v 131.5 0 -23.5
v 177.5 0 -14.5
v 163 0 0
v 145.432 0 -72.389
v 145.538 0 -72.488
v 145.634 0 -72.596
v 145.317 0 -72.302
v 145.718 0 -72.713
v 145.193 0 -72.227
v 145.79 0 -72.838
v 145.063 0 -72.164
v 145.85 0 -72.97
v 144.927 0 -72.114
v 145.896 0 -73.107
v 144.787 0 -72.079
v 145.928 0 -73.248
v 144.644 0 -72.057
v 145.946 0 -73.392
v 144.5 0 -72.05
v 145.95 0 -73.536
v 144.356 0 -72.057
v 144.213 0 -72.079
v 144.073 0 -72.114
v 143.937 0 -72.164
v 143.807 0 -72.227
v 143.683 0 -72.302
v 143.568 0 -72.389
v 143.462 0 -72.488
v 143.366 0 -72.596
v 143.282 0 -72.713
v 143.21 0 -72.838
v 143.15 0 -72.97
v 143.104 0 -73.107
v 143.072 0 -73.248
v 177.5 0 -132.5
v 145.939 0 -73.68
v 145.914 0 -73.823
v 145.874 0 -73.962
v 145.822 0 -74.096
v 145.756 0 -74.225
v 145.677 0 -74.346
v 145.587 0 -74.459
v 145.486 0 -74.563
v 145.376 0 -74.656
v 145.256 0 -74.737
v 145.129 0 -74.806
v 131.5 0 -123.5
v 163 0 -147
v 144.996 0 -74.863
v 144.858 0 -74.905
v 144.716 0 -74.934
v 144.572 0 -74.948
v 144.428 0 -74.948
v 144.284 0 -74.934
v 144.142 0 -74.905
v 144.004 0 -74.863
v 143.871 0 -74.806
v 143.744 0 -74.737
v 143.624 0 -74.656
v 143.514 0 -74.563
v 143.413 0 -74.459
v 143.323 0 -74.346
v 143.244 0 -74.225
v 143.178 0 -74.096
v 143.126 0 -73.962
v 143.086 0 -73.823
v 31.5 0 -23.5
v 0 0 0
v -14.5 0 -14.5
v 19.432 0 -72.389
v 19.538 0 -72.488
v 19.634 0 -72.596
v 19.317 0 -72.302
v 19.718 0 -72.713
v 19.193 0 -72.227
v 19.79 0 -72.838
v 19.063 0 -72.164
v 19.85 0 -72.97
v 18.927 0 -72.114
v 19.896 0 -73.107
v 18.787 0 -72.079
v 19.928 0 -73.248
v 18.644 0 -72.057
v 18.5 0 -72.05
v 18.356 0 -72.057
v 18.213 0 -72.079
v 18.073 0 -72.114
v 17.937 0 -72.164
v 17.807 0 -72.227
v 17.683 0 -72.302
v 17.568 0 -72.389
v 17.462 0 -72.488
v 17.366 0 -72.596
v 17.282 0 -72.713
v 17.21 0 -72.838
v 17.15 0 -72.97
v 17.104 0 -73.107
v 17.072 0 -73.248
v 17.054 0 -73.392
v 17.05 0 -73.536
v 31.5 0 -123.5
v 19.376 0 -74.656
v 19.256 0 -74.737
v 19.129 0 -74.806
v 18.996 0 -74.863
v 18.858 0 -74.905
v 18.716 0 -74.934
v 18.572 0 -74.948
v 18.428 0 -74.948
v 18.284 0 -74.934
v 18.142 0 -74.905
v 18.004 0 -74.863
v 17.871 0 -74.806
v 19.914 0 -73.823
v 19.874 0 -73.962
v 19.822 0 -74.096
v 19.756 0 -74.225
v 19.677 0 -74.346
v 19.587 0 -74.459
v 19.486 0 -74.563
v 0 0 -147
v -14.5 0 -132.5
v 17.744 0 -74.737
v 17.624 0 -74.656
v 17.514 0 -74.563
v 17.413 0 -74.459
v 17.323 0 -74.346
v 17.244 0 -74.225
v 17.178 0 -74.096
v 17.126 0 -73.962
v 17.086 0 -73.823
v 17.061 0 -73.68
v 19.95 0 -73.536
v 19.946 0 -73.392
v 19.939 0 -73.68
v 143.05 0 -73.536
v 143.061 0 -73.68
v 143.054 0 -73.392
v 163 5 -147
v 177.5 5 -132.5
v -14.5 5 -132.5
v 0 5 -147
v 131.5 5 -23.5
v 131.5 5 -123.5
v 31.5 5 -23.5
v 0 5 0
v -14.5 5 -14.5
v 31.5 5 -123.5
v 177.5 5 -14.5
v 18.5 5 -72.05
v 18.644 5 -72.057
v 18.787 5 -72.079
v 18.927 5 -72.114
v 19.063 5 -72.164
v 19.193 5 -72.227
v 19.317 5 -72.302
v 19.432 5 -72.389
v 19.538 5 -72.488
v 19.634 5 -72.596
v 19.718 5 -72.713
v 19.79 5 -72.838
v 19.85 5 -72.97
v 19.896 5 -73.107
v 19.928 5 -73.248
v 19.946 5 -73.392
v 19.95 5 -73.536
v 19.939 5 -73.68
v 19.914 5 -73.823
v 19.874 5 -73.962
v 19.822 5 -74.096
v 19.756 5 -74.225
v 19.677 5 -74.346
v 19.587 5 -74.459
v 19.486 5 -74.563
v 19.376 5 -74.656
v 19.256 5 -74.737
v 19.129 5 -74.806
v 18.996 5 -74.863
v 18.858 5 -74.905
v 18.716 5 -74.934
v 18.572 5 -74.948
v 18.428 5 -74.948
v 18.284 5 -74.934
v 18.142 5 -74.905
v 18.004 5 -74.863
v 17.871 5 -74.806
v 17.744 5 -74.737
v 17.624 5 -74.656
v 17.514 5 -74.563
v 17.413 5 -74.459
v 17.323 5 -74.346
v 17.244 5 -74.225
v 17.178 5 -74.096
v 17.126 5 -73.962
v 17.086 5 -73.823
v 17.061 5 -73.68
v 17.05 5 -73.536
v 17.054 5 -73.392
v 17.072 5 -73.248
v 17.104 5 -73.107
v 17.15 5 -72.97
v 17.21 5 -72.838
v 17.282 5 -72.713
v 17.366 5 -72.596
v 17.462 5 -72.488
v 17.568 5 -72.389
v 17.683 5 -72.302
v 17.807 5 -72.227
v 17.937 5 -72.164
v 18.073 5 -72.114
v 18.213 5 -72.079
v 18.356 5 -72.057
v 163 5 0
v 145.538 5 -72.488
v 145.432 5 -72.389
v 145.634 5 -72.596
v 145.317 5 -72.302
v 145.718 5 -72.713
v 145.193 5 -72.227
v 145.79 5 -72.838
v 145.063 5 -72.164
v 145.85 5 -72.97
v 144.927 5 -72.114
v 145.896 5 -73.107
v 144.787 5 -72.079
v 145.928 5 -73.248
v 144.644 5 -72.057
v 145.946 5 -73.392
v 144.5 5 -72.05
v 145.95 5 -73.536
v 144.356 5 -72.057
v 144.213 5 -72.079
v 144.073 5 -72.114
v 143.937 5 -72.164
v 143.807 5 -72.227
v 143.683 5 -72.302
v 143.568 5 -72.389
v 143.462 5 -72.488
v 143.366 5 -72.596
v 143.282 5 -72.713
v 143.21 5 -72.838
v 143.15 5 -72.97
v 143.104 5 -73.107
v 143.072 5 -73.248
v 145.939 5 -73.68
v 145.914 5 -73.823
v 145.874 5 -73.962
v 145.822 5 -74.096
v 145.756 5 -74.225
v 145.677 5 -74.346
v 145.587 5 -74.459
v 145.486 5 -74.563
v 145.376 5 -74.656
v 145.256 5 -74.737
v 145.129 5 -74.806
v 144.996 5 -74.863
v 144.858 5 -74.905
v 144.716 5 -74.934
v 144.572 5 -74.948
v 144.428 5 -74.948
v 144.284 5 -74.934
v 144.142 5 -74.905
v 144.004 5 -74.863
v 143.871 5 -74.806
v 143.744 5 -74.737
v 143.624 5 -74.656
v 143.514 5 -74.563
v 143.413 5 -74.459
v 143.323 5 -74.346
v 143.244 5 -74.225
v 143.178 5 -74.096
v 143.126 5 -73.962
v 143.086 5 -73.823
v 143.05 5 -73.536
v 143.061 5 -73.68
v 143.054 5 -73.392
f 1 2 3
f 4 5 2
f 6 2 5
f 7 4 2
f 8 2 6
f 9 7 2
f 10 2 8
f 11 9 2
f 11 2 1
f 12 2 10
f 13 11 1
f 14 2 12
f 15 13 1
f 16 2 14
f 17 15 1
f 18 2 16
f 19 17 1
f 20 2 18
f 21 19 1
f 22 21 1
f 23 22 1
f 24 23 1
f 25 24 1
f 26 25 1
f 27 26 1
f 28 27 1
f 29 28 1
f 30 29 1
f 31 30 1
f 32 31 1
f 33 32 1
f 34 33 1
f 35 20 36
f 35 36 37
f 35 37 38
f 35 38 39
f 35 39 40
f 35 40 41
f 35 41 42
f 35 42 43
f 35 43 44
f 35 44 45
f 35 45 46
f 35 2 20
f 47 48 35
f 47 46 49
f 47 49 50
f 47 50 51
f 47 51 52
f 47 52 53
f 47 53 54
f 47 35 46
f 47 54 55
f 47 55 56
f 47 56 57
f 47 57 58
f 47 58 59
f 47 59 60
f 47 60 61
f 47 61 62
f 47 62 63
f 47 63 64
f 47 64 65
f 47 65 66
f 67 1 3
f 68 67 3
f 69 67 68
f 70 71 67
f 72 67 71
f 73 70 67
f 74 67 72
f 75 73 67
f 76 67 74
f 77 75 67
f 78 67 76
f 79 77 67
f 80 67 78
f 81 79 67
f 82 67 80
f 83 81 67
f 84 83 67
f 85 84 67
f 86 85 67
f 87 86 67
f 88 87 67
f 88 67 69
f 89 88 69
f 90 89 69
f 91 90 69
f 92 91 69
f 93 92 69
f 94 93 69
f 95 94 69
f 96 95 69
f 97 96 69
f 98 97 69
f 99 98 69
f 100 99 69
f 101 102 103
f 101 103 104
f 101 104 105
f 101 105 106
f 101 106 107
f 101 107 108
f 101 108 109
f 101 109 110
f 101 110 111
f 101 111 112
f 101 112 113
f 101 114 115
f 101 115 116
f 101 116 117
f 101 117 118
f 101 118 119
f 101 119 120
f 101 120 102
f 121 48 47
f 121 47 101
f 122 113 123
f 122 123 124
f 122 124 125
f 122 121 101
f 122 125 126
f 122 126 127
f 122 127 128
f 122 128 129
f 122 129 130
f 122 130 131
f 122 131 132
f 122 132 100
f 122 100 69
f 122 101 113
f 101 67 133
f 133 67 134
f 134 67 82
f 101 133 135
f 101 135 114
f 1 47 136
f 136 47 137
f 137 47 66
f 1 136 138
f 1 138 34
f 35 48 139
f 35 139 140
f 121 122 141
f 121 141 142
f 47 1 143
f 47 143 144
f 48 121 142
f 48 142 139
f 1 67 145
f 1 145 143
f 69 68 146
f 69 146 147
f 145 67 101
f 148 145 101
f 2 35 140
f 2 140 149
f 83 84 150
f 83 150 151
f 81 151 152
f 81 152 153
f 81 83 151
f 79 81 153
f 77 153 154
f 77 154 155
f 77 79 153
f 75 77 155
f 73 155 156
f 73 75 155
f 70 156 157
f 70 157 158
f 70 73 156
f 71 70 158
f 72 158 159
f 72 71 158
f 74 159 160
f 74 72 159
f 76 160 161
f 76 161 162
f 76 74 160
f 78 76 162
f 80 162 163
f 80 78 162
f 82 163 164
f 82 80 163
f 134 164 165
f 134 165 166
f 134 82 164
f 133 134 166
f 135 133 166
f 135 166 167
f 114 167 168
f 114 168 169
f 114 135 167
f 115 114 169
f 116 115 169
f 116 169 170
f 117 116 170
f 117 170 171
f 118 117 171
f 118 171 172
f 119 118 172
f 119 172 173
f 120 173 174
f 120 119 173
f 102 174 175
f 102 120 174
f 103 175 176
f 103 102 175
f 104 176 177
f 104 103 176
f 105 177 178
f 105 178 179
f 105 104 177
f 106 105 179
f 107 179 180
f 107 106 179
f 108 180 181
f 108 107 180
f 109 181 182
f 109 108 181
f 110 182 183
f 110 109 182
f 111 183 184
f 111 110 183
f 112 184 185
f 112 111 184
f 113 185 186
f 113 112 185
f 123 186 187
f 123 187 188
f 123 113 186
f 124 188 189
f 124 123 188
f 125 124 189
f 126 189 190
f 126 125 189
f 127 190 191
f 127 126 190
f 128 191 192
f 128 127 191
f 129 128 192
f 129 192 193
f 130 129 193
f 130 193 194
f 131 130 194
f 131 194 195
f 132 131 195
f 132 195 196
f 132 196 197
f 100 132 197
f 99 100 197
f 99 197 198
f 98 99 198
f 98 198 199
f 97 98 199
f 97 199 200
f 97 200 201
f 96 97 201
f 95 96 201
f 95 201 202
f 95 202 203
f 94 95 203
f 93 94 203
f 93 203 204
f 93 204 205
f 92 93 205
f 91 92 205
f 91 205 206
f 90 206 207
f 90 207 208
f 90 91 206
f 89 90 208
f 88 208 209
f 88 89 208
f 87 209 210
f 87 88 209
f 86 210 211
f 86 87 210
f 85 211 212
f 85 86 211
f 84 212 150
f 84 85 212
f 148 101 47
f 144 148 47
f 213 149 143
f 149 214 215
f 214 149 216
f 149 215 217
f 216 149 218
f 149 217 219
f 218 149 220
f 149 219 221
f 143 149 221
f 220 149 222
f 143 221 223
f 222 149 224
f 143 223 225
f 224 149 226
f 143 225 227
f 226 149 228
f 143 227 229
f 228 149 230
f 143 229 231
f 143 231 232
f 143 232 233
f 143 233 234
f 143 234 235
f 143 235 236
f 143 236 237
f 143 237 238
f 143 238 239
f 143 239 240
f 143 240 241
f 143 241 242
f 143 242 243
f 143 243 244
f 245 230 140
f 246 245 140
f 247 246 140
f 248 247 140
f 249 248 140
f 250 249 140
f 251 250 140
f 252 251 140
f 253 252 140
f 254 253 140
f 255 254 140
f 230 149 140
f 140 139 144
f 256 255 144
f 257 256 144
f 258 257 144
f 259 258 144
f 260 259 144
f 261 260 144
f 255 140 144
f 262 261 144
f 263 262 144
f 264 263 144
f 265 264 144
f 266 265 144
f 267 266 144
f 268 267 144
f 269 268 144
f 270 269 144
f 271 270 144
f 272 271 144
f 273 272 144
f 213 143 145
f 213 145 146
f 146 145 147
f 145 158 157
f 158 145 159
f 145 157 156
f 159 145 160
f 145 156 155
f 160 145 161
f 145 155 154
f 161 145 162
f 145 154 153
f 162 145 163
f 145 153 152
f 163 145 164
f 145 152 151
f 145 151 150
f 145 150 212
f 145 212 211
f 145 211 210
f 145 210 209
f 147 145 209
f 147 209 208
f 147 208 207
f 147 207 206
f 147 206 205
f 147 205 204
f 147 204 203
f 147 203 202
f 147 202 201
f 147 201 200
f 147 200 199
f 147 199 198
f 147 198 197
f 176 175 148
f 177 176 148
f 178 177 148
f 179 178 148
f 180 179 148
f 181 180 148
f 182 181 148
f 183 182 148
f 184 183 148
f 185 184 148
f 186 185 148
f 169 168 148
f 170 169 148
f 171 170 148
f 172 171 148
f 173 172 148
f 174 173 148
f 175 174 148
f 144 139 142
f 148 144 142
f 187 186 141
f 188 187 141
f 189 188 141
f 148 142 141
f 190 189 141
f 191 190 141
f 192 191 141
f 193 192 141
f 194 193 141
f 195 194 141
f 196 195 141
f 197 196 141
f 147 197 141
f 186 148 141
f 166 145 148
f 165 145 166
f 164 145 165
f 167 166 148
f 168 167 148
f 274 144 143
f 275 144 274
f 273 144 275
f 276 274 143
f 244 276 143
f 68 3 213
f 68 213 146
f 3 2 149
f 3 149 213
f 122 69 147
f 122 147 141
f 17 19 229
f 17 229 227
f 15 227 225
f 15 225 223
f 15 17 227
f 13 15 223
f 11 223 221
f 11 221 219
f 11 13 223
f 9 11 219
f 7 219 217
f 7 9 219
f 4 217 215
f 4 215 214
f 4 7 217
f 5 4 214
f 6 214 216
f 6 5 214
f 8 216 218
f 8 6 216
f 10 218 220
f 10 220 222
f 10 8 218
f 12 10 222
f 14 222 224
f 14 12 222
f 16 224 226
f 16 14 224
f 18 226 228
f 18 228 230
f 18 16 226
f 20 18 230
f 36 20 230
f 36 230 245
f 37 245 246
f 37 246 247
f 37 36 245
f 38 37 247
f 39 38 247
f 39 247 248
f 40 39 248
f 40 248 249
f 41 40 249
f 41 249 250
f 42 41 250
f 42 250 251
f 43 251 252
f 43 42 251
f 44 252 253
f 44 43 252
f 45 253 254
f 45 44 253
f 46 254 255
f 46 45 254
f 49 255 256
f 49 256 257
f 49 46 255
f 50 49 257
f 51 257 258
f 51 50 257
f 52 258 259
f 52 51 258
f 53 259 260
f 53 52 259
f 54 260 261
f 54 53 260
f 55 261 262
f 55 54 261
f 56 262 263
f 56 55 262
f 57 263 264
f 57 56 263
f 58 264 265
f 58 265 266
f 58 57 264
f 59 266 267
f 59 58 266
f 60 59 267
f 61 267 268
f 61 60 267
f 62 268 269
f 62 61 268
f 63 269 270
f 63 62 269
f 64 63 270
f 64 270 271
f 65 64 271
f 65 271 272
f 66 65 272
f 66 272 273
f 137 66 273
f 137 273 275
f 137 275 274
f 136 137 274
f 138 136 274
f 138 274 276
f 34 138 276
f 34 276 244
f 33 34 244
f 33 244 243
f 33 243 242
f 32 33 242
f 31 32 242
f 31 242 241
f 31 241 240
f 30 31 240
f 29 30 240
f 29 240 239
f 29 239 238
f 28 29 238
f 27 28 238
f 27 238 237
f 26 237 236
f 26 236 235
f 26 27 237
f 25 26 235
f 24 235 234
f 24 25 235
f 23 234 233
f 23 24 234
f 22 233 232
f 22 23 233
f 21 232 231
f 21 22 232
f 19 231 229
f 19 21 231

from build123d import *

# Parameters (mm, degrees)
CROQUIS1_R              = 1.45
CROQUIS1_W              = 100
CROQUIS1_H              = 100
SALIENTE_EXTRUIR1_DEPTH = 5


with BuildPart() as part:
    # Croquis1 → Saliente-Extruir1 (new body)
    with BuildSketch(Plane(origin=(0, 0, 0), x_dir=(1, 0, 0), z_dir=(0, 1, 0))):
        Polygon((0, 0), (-14.5, 14.5), (-14.5, 132.5), (0, 147), (163, 147), (177.5, 132.5), (177.5, 14.5), (163, 0), align=None)
        with Locations(Location((18.5, 73.5, 0), (0, 0, 270))):
            Circle(CROQUIS1_R, mode=Mode.SUBTRACT)
        with Locations(Location((144.5, 73.5, 0), (0, 0, 270))):
            Circle(CROQUIS1_R, mode=Mode.SUBTRACT)
        with Locations((81.5, 73.5)):
            Rectangle(CROQUIS1_W, CROQUIS1_H, mode=Mode.SUBTRACT)
    extrude(amount=SALIENTE_EXTRUIR1_DEPTH)


solid = part.part
